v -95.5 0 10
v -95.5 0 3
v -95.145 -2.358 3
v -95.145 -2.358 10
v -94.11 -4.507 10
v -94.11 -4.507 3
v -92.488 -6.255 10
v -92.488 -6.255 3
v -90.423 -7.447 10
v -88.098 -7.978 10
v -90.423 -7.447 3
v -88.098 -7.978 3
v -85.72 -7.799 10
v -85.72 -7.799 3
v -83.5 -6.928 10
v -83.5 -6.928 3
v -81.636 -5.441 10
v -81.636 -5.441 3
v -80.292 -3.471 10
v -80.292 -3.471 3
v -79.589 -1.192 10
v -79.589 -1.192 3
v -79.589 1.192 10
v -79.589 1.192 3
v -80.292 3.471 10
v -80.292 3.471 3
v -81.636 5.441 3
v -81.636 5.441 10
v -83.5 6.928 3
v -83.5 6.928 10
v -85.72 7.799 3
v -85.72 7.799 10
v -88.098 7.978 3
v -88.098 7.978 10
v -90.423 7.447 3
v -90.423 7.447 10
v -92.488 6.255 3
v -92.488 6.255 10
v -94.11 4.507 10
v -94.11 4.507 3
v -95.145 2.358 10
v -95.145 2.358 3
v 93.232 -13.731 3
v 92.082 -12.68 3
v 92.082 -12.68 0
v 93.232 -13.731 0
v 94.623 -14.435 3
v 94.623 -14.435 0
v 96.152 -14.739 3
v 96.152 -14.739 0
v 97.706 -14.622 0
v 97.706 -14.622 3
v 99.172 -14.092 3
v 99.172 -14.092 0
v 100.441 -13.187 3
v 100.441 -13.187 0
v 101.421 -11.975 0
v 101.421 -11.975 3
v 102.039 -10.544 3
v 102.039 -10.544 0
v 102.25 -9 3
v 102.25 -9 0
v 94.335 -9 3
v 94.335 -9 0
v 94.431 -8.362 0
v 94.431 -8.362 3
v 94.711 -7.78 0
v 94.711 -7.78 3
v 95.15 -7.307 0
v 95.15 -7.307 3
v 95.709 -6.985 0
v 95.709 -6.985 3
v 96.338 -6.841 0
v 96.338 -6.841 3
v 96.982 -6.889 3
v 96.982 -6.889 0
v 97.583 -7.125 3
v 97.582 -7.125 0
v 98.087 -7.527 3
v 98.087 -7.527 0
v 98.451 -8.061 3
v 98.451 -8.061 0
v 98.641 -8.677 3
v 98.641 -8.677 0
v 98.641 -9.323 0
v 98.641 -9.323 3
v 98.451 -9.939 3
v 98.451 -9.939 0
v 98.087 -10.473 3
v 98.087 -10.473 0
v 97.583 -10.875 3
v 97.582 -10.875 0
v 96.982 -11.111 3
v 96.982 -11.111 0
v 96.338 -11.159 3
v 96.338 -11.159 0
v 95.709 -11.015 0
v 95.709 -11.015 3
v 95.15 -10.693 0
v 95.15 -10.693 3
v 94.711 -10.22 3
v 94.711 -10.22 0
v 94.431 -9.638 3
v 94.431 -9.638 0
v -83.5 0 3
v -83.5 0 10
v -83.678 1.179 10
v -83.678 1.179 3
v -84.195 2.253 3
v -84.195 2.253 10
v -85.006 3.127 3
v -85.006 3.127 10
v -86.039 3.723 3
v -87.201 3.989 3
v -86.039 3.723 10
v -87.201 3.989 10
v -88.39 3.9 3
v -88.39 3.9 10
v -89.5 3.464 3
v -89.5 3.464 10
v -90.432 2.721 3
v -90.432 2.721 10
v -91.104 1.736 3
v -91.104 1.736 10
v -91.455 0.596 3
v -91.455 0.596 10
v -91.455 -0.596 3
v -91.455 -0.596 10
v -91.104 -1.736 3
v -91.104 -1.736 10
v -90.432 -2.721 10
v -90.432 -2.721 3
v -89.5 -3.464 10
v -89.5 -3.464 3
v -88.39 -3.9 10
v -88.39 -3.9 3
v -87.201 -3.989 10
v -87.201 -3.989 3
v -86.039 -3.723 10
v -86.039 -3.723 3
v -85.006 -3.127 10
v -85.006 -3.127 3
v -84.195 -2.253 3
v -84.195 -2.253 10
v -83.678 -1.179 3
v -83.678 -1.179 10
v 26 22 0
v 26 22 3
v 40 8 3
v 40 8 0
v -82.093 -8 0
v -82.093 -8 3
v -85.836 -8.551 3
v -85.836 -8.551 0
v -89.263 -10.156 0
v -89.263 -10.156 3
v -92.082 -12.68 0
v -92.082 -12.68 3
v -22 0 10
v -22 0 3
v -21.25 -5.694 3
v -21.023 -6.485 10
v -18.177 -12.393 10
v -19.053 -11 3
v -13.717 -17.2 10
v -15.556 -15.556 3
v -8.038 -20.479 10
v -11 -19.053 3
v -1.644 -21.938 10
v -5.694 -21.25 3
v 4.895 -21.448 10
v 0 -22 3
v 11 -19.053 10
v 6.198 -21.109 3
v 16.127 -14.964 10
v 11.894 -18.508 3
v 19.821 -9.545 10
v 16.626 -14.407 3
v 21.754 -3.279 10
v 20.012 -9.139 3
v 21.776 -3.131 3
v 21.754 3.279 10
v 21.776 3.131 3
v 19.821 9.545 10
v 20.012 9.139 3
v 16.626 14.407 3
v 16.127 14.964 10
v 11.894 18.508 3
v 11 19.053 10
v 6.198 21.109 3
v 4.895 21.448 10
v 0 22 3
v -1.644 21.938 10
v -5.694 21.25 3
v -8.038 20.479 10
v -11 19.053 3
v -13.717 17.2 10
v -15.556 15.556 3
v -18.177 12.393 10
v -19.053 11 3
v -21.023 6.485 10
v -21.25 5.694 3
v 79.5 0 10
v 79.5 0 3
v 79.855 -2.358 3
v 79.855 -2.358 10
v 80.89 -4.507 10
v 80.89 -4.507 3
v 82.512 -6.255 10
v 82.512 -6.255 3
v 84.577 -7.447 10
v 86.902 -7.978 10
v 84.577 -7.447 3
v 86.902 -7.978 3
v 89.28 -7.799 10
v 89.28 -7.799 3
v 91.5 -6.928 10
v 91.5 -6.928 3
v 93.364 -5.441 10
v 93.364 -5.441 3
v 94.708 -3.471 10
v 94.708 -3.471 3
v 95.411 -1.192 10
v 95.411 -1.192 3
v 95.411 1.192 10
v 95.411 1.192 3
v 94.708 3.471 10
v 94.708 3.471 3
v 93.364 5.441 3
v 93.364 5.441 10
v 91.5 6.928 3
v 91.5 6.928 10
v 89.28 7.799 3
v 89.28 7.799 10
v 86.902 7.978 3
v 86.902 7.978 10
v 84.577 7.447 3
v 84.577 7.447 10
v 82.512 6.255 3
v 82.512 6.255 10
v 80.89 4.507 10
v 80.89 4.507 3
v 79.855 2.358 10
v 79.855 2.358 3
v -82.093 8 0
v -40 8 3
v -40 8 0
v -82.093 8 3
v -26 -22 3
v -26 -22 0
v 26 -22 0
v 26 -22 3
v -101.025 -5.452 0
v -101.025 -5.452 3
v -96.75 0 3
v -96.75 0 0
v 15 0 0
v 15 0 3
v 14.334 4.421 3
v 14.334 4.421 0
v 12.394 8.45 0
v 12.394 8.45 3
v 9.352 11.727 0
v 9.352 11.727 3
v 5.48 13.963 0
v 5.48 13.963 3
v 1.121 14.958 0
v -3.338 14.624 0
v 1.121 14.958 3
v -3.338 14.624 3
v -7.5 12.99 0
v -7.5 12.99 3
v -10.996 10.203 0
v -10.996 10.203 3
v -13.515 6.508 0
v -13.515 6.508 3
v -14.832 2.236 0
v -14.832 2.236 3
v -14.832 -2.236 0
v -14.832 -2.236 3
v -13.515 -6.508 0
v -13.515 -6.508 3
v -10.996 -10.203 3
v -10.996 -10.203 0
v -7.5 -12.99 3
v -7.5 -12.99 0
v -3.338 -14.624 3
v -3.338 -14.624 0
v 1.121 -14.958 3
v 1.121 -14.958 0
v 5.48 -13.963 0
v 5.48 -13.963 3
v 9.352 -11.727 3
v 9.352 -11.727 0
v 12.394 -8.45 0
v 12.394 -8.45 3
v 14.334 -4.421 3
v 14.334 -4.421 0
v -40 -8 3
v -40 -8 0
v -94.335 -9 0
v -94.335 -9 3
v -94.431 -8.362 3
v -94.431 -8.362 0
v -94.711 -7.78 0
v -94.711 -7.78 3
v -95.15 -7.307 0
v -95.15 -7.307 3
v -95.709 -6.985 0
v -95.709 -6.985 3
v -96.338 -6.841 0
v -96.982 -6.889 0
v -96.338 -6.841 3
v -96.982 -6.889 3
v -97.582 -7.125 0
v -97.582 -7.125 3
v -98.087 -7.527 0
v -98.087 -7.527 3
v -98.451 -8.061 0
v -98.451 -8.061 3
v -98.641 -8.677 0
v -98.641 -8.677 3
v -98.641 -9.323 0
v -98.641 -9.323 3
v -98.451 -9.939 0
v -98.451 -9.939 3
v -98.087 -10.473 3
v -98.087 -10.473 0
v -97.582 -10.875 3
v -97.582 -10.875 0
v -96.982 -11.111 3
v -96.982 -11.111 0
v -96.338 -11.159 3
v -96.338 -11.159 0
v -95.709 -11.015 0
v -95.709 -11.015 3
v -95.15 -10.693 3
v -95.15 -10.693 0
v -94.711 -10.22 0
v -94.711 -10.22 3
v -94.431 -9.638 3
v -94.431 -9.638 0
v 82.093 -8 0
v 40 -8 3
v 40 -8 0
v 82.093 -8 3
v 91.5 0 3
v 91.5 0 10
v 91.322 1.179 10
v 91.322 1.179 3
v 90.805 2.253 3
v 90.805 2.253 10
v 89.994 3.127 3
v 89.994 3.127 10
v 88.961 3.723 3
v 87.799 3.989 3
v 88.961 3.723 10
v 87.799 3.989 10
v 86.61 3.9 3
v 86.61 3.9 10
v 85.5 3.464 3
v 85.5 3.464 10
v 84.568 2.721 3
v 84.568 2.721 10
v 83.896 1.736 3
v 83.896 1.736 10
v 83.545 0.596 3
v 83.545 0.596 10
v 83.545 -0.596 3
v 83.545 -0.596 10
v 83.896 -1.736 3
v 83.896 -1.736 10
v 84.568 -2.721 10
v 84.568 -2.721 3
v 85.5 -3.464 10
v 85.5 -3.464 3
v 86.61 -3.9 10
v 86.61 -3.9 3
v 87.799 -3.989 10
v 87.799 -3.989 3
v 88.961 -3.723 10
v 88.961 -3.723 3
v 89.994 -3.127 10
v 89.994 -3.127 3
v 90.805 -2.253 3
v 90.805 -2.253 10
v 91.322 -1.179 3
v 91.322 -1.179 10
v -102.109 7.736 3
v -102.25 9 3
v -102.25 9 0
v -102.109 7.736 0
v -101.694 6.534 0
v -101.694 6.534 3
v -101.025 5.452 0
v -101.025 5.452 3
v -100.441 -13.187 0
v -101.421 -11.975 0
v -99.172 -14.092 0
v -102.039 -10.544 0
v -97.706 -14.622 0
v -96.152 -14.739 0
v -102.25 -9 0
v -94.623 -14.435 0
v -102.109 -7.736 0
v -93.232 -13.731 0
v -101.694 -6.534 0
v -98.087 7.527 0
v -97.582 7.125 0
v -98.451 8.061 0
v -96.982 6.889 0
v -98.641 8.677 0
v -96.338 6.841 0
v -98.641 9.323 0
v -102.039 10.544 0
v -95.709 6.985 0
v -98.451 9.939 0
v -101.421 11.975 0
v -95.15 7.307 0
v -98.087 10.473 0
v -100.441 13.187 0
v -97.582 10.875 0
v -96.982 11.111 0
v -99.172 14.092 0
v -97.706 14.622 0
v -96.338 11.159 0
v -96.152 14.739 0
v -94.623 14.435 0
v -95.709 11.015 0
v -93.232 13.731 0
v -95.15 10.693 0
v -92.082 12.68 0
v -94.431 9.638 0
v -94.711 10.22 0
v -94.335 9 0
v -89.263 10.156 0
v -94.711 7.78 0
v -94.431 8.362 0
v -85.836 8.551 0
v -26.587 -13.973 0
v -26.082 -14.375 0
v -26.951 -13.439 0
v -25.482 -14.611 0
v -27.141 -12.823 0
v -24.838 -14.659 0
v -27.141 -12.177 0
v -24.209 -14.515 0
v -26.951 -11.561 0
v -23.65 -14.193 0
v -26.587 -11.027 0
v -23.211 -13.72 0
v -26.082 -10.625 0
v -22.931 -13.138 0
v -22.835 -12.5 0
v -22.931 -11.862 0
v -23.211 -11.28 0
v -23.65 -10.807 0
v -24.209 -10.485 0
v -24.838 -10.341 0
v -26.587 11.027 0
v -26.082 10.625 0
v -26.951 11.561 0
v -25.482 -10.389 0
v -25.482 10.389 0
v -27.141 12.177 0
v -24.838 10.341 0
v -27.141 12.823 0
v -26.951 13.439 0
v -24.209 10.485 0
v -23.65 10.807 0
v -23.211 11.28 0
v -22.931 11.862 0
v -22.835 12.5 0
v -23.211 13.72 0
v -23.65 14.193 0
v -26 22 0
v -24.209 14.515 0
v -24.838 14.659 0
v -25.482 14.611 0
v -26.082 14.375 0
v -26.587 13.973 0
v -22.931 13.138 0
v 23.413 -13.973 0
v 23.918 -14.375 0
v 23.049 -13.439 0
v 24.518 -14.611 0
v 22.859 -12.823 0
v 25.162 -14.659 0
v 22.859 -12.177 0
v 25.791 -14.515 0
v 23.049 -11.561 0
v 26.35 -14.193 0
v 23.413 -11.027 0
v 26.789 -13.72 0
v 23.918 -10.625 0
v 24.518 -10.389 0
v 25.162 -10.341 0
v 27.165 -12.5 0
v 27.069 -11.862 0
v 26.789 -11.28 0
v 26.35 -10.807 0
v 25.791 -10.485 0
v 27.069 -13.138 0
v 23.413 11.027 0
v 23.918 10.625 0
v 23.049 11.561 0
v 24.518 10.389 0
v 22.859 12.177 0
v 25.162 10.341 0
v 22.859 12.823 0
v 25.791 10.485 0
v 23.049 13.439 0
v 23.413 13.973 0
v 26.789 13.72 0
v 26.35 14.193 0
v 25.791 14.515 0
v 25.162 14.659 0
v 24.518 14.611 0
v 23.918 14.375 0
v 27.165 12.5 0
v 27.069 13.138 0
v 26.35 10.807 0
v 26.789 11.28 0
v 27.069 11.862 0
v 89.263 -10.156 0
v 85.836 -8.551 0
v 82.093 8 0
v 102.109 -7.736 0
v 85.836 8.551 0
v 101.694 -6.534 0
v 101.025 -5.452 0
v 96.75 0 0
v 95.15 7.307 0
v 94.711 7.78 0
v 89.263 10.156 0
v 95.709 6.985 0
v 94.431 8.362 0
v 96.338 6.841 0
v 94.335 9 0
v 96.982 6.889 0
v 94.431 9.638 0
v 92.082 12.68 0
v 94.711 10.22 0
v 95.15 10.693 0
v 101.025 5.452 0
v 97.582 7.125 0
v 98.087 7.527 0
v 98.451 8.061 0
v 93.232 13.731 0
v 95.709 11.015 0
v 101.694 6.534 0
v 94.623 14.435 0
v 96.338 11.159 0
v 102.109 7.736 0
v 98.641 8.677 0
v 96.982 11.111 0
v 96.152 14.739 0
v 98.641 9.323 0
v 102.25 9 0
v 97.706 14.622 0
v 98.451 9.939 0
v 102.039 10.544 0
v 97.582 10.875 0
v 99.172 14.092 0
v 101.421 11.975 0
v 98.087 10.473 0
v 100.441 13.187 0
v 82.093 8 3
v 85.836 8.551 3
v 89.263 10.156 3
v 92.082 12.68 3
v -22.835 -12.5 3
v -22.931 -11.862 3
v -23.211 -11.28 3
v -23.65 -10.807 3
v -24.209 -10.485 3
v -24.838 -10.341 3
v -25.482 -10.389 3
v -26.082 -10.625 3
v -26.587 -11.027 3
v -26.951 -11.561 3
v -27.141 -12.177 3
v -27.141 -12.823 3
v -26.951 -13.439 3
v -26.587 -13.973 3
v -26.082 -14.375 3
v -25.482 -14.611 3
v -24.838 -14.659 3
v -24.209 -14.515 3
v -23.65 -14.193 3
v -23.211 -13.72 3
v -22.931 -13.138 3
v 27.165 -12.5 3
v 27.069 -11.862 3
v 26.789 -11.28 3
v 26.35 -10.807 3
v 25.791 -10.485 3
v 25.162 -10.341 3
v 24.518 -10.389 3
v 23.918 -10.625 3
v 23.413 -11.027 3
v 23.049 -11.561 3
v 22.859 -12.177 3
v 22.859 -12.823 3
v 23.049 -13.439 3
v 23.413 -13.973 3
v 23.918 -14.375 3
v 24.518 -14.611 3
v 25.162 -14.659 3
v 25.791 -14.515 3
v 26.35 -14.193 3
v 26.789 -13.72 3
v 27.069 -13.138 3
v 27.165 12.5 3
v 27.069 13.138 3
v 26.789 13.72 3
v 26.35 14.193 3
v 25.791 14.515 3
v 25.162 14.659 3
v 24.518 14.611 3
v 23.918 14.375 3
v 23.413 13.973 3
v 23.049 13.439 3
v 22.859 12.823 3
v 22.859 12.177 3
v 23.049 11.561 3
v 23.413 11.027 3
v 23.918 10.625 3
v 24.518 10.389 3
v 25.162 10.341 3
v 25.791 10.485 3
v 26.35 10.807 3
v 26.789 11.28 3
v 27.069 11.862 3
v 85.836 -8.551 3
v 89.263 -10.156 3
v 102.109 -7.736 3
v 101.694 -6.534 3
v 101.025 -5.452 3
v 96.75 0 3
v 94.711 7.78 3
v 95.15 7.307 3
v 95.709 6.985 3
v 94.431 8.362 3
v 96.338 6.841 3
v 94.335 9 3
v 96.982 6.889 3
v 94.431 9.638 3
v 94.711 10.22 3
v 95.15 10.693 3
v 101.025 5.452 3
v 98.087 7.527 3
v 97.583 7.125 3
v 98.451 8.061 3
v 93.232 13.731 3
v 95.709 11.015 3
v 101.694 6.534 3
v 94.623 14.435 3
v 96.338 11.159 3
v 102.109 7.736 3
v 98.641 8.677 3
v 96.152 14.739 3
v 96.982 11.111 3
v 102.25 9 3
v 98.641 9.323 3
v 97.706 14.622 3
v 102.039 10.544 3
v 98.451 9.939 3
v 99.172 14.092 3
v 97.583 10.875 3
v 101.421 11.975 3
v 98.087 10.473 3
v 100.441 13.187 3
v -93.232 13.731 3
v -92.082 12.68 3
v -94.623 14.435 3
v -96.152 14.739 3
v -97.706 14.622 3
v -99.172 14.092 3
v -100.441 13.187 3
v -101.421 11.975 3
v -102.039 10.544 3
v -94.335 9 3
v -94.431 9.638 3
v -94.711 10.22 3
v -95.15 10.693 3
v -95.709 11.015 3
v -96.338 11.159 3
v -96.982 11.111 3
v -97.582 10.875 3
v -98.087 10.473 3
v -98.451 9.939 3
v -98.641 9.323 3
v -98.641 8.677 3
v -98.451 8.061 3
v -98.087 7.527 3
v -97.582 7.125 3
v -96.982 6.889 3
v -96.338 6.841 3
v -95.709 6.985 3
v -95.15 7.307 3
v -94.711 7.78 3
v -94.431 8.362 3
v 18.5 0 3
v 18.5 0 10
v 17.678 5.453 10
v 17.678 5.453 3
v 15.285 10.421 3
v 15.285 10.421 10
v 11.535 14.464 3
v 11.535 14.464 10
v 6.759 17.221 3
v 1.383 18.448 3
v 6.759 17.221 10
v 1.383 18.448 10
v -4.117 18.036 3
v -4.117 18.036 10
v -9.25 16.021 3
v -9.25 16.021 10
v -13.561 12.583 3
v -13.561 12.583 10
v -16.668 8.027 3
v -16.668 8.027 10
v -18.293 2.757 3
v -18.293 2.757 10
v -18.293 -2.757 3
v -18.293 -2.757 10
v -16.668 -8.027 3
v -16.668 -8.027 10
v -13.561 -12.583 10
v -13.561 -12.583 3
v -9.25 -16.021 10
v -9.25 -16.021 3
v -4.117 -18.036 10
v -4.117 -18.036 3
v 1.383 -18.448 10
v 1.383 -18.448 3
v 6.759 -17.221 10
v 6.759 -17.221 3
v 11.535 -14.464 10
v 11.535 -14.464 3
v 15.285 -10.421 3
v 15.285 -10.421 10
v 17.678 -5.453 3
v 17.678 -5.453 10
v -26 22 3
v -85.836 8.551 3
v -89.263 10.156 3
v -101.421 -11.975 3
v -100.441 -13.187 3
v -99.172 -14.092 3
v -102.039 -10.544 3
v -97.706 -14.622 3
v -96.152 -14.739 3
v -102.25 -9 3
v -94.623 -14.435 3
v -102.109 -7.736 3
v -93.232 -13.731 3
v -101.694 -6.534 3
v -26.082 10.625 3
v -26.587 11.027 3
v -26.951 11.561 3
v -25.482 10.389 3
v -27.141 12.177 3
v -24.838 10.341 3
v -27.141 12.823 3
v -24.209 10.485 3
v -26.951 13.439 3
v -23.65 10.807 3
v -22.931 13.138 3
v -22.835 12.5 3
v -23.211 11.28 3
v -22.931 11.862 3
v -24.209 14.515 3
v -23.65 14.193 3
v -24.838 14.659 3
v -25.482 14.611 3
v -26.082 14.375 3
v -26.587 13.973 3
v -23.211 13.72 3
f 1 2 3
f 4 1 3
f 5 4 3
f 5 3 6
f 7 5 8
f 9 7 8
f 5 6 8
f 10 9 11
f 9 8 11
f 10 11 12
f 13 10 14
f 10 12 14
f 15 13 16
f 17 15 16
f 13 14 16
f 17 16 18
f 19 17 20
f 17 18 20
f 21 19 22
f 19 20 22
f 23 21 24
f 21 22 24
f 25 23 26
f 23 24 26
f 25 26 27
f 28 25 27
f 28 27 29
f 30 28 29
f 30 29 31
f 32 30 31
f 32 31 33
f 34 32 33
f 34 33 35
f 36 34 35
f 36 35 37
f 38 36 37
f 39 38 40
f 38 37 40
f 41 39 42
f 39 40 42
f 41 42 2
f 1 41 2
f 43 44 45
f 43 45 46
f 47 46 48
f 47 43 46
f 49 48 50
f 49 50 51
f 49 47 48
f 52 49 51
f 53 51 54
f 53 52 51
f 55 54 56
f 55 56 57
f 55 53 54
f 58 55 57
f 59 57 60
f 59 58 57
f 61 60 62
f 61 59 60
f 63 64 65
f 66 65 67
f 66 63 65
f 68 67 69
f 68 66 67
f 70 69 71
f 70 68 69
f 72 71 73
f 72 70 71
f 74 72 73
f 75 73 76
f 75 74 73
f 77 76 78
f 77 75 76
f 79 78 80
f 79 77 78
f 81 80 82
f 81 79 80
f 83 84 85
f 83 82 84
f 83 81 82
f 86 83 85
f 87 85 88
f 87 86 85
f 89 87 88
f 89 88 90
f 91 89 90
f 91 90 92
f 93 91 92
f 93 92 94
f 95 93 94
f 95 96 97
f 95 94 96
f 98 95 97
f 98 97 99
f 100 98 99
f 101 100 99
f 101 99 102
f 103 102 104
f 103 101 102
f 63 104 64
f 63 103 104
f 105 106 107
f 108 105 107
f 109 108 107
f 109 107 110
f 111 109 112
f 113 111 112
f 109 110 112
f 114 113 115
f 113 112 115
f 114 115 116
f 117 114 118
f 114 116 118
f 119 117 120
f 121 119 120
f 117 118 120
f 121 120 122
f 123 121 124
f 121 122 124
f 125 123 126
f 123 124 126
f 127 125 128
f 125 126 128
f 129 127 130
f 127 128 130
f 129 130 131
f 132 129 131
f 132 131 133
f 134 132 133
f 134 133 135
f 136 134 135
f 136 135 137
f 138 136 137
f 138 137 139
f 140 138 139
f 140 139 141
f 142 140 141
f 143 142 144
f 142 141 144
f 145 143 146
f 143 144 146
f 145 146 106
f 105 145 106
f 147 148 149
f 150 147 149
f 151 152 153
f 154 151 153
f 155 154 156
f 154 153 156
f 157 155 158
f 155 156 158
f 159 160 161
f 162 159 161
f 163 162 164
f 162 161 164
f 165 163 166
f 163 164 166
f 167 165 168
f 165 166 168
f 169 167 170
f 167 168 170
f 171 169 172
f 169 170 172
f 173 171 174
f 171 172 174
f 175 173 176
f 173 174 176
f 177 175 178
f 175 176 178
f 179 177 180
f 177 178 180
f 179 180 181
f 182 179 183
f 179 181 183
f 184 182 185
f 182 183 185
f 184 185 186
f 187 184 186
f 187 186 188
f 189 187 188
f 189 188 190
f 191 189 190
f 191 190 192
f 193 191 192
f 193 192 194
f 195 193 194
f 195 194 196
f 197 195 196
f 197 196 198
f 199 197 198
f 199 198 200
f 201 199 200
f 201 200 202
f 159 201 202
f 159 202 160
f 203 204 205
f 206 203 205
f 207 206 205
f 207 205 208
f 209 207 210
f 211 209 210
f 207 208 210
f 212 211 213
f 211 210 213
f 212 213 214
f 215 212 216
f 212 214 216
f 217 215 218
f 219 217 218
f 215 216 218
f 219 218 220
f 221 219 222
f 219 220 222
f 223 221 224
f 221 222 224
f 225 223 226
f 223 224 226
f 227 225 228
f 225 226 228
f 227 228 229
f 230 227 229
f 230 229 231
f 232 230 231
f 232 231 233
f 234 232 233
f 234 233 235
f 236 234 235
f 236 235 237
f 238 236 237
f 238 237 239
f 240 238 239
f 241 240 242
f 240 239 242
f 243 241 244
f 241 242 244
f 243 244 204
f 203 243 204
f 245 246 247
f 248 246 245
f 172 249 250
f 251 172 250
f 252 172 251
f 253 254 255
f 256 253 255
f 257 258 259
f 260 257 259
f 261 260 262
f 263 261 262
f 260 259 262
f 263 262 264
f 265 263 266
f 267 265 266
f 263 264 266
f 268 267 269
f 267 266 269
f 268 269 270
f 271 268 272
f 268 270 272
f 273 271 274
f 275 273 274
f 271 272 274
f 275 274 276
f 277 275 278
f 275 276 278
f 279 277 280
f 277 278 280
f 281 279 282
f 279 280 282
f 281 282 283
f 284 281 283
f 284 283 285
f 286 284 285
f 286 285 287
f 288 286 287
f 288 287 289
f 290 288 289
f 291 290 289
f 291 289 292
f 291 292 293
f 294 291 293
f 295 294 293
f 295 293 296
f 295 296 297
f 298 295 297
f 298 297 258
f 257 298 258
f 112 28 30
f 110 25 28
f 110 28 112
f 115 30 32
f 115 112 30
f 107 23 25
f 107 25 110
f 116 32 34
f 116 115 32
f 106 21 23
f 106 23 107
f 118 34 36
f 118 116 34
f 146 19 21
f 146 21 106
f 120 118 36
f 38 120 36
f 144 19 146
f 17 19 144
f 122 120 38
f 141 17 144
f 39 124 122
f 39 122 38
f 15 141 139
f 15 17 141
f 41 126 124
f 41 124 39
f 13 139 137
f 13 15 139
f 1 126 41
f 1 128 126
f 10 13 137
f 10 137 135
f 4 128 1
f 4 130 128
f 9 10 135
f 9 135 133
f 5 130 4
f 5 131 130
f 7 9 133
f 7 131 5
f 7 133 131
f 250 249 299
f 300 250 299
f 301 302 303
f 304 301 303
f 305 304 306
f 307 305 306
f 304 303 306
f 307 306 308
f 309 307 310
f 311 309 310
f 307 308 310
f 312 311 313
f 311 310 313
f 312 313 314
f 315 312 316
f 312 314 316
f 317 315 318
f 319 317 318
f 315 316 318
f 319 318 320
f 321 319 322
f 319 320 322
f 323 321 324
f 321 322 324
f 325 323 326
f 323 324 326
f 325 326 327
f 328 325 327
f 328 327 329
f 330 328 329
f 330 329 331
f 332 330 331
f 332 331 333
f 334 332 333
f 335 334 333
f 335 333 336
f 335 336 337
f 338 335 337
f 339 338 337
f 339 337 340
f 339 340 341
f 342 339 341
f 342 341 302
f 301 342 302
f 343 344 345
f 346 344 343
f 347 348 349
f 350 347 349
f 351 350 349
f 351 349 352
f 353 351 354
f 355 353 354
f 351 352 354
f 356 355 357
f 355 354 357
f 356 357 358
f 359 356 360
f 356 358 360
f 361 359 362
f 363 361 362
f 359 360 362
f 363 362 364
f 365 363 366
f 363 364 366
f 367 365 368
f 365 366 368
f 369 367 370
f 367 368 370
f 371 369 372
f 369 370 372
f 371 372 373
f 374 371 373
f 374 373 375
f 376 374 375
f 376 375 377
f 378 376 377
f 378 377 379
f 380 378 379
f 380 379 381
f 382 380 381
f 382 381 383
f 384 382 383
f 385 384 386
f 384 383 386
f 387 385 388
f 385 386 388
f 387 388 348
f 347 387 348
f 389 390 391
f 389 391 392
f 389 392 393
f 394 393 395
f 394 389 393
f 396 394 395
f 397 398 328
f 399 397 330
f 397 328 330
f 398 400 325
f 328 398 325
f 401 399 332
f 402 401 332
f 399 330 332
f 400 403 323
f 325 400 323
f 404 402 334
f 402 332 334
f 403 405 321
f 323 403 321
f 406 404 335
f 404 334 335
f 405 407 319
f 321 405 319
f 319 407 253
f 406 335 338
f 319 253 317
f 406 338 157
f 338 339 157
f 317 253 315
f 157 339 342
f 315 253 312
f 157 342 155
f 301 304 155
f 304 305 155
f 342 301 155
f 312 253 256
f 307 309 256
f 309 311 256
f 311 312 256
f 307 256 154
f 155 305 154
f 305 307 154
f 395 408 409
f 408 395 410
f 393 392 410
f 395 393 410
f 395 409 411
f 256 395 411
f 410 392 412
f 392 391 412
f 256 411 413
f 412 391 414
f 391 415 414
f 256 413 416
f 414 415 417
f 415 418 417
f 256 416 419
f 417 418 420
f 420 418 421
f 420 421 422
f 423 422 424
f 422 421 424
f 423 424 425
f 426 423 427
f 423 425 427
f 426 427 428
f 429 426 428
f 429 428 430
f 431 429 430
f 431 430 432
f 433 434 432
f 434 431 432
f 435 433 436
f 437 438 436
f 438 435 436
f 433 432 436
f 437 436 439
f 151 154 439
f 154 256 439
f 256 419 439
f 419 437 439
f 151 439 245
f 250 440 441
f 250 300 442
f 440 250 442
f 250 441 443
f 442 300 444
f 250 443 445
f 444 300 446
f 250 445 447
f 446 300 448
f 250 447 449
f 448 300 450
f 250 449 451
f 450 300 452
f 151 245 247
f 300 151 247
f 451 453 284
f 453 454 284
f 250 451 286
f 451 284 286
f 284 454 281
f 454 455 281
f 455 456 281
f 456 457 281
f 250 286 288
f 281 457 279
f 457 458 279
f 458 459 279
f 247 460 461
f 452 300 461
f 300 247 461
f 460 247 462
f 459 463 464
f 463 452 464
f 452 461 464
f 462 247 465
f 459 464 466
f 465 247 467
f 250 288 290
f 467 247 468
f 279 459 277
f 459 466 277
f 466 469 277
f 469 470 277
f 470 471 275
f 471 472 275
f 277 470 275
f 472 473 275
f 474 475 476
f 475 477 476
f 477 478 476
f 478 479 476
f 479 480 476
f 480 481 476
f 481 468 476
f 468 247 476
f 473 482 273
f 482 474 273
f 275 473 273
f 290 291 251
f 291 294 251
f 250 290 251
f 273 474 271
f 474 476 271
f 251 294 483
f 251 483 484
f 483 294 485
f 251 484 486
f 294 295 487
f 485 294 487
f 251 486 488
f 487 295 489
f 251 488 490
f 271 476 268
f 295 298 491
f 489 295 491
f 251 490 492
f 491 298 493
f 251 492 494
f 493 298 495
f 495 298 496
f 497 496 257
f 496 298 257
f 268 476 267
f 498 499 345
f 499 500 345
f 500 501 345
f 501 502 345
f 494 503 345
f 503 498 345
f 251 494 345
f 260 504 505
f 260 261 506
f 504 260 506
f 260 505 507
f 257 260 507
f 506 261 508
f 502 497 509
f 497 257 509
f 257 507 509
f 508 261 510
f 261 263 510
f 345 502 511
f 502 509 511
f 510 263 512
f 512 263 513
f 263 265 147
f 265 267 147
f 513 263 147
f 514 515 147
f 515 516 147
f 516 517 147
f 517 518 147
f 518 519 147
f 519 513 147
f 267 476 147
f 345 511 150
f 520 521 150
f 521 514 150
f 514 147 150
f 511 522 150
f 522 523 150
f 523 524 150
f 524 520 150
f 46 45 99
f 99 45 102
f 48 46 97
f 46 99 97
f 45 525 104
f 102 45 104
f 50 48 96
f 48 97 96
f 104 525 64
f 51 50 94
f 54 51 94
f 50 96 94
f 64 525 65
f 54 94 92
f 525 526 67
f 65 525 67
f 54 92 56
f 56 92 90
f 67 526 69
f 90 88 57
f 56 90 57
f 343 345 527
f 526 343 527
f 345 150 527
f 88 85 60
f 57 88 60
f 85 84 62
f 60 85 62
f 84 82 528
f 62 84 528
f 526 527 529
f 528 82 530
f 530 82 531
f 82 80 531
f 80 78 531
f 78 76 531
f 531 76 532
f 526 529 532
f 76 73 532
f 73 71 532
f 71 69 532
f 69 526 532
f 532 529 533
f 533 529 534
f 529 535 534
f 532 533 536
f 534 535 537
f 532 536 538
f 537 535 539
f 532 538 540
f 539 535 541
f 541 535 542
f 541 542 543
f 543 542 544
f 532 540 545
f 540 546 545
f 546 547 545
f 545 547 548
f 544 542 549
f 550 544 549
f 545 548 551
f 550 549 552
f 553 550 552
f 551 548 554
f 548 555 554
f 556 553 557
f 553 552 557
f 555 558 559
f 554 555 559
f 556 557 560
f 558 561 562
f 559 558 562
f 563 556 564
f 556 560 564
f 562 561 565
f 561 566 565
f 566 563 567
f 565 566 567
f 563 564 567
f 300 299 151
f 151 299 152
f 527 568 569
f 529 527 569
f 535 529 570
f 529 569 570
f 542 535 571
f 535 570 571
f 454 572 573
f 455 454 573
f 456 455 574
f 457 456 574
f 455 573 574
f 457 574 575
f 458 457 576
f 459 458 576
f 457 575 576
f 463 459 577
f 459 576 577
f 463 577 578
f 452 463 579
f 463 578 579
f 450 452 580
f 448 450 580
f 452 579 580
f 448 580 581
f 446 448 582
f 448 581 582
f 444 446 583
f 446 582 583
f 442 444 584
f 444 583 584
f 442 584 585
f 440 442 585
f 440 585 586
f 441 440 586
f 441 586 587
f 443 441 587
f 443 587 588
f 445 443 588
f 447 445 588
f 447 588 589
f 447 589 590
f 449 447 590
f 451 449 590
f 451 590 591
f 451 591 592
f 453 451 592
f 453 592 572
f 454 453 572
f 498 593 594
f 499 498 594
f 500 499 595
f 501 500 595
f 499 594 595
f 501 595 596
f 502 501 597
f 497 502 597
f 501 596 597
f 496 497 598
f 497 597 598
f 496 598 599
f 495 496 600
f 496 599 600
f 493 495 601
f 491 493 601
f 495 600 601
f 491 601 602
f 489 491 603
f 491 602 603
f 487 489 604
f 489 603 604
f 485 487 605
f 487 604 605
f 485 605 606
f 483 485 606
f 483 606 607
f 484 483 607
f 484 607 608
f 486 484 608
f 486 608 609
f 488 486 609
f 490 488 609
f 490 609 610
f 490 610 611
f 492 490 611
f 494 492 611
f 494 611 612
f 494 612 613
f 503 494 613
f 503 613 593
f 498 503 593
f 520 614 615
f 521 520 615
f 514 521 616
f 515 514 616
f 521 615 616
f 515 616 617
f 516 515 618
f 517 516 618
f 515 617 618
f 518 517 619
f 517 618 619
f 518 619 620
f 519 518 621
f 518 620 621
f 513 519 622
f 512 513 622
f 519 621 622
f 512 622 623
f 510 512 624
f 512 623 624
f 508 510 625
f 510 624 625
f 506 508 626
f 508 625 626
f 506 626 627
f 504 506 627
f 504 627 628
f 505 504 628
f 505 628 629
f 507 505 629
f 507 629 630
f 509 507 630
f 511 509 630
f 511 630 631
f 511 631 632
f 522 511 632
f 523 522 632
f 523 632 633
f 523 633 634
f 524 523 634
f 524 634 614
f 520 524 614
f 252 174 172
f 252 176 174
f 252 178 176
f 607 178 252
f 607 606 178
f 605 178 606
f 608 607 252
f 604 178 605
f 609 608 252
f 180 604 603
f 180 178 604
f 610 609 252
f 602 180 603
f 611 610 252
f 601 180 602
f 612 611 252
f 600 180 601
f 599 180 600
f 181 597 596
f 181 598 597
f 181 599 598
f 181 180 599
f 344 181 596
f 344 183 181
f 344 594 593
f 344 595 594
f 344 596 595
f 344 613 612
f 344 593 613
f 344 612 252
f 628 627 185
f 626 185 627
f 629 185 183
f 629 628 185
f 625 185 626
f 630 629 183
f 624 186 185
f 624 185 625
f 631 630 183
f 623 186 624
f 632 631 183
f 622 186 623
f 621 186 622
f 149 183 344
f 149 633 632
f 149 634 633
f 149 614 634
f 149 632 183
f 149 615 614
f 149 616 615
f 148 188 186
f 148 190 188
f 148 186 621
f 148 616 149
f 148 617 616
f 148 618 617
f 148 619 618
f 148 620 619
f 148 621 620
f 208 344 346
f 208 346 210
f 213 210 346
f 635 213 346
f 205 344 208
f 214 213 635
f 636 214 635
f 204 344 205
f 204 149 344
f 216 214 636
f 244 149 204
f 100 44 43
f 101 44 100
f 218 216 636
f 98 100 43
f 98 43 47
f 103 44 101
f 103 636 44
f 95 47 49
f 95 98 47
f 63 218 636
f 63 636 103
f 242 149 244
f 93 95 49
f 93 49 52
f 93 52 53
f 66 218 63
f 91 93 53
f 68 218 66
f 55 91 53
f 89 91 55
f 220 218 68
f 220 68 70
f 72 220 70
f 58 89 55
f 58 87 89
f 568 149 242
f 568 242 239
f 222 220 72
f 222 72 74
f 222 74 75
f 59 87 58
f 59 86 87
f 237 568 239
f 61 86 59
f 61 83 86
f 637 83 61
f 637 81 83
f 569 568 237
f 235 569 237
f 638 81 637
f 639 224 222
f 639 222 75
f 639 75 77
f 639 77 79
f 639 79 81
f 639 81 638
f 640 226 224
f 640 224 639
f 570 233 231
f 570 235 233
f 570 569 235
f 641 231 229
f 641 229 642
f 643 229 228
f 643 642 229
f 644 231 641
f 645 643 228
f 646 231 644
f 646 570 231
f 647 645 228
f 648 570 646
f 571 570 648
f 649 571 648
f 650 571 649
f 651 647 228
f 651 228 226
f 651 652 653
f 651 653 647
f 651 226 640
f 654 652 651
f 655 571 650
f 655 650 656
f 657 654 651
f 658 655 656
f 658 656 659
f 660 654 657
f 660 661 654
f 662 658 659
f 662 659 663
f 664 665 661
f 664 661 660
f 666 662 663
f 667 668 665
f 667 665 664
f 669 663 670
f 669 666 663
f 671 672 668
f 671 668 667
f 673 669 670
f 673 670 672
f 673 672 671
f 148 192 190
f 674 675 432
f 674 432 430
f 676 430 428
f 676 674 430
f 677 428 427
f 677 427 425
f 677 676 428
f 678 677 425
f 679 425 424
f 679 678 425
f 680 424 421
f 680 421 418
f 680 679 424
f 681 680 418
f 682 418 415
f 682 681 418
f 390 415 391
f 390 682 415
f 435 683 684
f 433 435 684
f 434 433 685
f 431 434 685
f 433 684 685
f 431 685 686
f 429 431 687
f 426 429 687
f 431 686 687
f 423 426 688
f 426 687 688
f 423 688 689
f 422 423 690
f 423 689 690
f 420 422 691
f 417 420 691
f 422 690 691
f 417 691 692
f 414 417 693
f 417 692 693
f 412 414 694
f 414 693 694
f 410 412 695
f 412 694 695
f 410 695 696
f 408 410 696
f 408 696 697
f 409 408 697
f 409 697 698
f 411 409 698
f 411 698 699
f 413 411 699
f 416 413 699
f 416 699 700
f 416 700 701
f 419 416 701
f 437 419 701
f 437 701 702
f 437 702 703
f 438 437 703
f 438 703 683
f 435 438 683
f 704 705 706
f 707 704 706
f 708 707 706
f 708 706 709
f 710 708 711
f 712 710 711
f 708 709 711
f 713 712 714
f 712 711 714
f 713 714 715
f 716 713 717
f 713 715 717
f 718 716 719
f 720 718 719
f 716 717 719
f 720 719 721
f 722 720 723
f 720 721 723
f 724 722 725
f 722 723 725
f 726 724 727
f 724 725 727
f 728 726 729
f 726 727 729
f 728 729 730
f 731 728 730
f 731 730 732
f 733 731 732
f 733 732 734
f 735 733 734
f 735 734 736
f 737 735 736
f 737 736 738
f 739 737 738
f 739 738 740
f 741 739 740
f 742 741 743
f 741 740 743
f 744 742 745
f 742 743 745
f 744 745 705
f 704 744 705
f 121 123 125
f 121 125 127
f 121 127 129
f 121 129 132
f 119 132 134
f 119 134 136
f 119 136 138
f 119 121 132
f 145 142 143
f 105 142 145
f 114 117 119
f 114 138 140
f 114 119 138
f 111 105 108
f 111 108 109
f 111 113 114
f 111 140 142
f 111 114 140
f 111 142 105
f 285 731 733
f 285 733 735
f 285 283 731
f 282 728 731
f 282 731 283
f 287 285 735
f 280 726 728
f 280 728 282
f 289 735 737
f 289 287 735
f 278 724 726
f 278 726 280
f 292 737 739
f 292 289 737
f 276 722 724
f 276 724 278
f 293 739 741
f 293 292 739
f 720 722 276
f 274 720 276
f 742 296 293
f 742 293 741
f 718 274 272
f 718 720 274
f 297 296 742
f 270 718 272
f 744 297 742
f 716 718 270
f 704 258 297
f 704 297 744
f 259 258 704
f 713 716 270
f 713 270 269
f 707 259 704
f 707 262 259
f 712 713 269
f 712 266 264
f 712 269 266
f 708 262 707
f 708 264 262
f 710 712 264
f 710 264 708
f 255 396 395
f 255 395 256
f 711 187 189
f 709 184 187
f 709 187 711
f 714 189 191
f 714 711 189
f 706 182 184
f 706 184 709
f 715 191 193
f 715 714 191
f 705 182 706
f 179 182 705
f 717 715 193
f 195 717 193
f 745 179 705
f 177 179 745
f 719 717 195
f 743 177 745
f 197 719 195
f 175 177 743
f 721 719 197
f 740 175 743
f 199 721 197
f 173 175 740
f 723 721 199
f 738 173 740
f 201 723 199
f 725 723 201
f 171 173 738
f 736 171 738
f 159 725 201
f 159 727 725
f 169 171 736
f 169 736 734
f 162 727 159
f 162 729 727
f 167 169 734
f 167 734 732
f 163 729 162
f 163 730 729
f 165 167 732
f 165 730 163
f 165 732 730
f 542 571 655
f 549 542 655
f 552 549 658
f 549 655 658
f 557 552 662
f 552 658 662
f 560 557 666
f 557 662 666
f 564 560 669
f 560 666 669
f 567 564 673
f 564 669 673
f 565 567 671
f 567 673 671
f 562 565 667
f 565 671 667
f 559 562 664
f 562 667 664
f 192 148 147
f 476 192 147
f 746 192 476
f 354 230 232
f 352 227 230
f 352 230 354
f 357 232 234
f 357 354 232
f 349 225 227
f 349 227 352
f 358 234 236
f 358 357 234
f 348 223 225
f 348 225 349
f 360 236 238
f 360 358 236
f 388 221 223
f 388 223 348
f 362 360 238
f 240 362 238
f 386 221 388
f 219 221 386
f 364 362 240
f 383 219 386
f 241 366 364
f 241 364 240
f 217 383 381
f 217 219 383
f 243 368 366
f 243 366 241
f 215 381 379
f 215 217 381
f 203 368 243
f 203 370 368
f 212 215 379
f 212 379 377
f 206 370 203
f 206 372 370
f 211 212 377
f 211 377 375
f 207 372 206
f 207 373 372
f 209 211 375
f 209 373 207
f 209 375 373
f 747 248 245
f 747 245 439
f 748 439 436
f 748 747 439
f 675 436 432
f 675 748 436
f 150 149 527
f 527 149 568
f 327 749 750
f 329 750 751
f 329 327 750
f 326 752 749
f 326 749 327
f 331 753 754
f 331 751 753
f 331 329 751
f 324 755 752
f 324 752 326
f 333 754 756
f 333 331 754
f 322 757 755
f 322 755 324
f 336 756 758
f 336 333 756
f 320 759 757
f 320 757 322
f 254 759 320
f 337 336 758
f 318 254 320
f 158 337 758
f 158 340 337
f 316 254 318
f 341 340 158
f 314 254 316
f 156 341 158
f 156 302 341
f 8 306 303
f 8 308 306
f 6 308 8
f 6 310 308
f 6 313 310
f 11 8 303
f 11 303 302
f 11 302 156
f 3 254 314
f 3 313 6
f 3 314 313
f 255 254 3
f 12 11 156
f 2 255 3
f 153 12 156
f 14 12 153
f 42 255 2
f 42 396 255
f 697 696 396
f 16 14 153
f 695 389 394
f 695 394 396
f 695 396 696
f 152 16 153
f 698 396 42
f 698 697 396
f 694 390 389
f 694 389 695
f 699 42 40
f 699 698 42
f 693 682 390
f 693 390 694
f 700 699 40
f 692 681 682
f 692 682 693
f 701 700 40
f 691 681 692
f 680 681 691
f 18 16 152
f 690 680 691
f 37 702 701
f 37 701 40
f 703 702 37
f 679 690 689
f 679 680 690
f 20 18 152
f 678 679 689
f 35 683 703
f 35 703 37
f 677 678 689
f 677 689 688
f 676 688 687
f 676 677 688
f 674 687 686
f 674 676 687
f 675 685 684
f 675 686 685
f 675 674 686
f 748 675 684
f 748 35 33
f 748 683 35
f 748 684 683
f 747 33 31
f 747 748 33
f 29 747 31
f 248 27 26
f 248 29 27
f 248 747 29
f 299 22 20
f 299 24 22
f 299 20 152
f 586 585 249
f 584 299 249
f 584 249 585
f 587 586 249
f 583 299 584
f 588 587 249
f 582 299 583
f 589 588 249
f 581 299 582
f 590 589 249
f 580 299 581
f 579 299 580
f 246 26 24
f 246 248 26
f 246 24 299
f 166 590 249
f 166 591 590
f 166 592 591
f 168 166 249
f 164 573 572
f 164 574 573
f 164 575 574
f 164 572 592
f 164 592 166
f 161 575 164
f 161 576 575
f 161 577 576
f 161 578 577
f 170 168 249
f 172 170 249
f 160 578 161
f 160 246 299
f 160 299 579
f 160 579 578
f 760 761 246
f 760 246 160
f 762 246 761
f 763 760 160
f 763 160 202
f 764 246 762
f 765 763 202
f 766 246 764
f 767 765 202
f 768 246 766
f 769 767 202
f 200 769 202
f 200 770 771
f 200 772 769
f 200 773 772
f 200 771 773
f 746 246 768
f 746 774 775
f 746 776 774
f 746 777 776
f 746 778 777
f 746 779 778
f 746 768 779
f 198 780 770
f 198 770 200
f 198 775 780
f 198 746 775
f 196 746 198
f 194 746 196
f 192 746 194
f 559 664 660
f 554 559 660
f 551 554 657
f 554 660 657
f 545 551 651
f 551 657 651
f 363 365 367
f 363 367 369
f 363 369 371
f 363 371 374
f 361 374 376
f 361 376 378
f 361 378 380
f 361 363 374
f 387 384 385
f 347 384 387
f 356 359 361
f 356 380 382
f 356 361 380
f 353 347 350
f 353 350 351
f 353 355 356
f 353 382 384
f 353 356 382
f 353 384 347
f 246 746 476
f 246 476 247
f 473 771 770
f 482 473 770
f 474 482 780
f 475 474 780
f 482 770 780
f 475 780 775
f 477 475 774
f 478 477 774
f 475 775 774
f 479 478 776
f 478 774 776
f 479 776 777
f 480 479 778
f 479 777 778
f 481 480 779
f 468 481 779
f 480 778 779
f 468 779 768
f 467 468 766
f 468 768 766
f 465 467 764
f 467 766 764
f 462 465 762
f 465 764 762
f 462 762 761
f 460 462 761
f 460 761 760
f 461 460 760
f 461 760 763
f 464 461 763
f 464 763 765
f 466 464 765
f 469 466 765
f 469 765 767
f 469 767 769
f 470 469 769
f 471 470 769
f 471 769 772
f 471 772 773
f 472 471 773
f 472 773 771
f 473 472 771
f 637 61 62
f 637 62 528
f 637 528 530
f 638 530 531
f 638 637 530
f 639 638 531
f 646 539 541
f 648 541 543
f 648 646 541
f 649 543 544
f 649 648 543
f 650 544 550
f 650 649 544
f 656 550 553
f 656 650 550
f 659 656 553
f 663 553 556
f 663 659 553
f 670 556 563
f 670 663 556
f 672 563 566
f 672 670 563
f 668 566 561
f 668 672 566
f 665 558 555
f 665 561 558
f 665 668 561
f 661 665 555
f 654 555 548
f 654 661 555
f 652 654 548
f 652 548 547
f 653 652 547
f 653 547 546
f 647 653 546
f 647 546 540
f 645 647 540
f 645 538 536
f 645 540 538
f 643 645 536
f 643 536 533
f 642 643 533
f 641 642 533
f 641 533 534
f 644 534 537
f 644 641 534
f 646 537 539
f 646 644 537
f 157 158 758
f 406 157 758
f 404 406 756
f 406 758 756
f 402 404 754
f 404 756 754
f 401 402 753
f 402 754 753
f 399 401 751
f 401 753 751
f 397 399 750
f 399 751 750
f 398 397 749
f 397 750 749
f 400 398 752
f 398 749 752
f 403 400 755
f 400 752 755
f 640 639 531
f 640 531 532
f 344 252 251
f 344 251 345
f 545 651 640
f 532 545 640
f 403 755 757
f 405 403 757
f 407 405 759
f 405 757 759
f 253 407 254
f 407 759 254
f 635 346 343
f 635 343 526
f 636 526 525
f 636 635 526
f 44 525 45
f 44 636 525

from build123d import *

# Parameters (mm, degrees)
SKETCH1_W               = 204.5
SKETCH1_H               = 62.5
BOSS_EXTRUDE1_DEPTH     = 3
SKETCH2_R               = 8
BOSS_EXTRUDE2_DEPTH     = 7
SKETCH3_R               = 22
BOSS_EXTRUDE3_DEPTH     = 7
SKETCH4_R               = 2.165
CUT_EXTRUDE1_DEPTH      = 108.147678463
CUT_EXTRUDE3_DEPTH      = 7
MIRROR2_COPY_1_SKETCH_R = 2.165
MIRROR2_COPY_1_DEPTH    = 108.147678463
MIRROR2_COPY_2_DEPTH    = 7
MIRROR2_COPY_3_SKETCH_R = 2.165
MIRROR2_COPY_3_DEPTH    = 108.147678463
SKETCH7_R               = 18.5
CUT_EXTRUDE4_DEPTH      = 7
SKETCH11_R              = 4
CUT_EXTRUDE7_DEPTH      = 7
SKETCH12_R              = 15
CUT_EXTRUDE8_DEPTH      = 105.82395957
SKETCH13_R              = 2.165
CUT_EXTRUDE9_DEPTH      = 105.82395957


with BuildPart() as part:
    # Sketch1 → Boss-Extrude1 (new body)
    with BuildSketch(Plane.XY):
        Rectangle(SKETCH1_W, SKETCH1_H)
    extrude(amount=BOSS_EXTRUDE1_DEPTH)

    # Sketch2 → Boss-Extrude2 (add)
    with BuildSketch(Plane.XY.offset(3)):
        with Locations(Location((-87.5, 0, 0), (0, 0, 180))):
            Circle(SKETCH2_R)
        with Locations(Location((87.5, 0, 0), (0, 0, 180))):
            Circle(SKETCH2_R)
    extrude(amount=BOSS_EXTRUDE2_DEPTH)

    # Sketch3 → Boss-Extrude3 (add)
    with BuildSketch(Plane.XY.offset(3)):
        with Locations(Location((0, 0, 0), (0, 0, 180))):
            Circle(SKETCH3_R)
    extrude(amount=BOSS_EXTRUDE3_DEPTH)

    # Sketch4 → Cut-Extrude1 (cut, through all)
    with BuildSketch(Plane.XY.offset(3)):
        with Locations((-96.5, 9)):
            Circle(SKETCH4_R)
        with Locations((-96.5, -9)):
            Circle(SKETCH4_R)
    cut_extrude1 = extrude(amount=-CUT_EXTRUDE1_DEPTH, mode=Mode.SUBTRACT)

    # Sketch6 → Cut-Extrude3 (cut)
    with BuildSketch(Plane.XY.offset(3)):
        with BuildLine():
            Line((-102.25, 0), (-102.25, -9))
            ThreePointArc((-102.25, -9), (-101.935103767, -7.123261595), (-101.024905378, -5.452080705))
            Line((-101.024905378, -5.452080705), (-96.75, 0))
            Line((-96.75, 0), (-102.25, 0))
        make_face()
        with BuildLine():
            Line((-40, -8), (-82.092970466, -8))
            ThreePointArc((-82.092970466, -8), (-87.608403359, -9.22799932), (-92.081844276, -12.68))
            ThreePointArc((-92.081844276, -12.68), (-98.456796437, -14.406796437), (-102.25, -9))
            Line((-102.25, -9), (-102.25, -31.25))
            Line((-102.25, -31.25), (0, -31.25))
            Line((0, -31.25), (0, -22))
            Line((0, -22), (-26, -22))
            Line((-26, -22), (-40, -8))
        make_face()
    cut_extrude3 = extrude(amount=-CUT_EXTRUDE3_DEPTH, mode=Mode.SUBTRACT)

    # Mirror1: Cut-Extrude1, Cut-Extrude3 across plane
    add(cut_extrude1.mirror(Plane(origin=(0, 0, 0), x_dir=(0, 0, 1), z_dir=(1, 0, 0))), mode=Mode.SUBTRACT)
    add(cut_extrude3.mirror(Plane(origin=(0, 0, 0), x_dir=(0, 0, 1), z_dir=(1, 0, 0))), mode=Mode.SUBTRACT)

    # Mirror2: Cut-Extrude3 across plane
    add(cut_extrude3.mirror(Plane.ZX), mode=Mode.SUBTRACT)

    # Mirror2 copy 1 sketch → Mirror2 copy 1 (cut, through all)
    with BuildSketch(Plane(origin=(0, 0, 3), x_dir=(-1, 0, 0), z_dir=(0, 0, 1))):
        with Locations((-96.5, 9)):
            Circle(MIRROR2_COPY_1_SKETCH_R)
        with Locations((-96.5, -9)):
            Circle(MIRROR2_COPY_1_SKETCH_R)
    extrude(amount=-MIRROR2_COPY_1_DEPTH, mode=Mode.SUBTRACT)

    # Mirror2 copy 2 sketch → Mirror2 copy 2 (cut)
    with BuildSketch(Plane(origin=(0, 0, 3), x_dir=(-1, 0, 0), z_dir=(0, 0, 1))):
        with BuildLine():
            Line((-102.25, 0), (-102.25, -9))
            ThreePointArc((-102.25, -9), (-101.935103767, -7.123261595), (-101.024905378, -5.452080705))
            Line((-101.024905378, -5.452080705), (-96.75, 0))
            Line((-96.75, 0), (-102.25, 0))
        make_face()
        with BuildLine():
            Line((-40, -8), (-82.092970466, -8))
            ThreePointArc((-82.092970466, -8), (-87.608403359, -9.22799932), (-92.081844276, -12.68))
            ThreePointArc((-92.081844276, -12.68), (-98.456796437, -14.406796437), (-102.25, -9))
            Line((-102.25, -9), (-102.25, -31.25))
            Line((-102.25, -31.25), (0, -31.25))
            Line((0, -31.25), (0, -22))
            Line((0, -22), (-26, -22))
            Line((-26, -22), (-40, -8))
        make_face()
    extrude(amount=-MIRROR2_COPY_2_DEPTH, mode=Mode.SUBTRACT)

    # Mirror2 copy 3 sketch → Mirror2 copy 3 (cut, through all)
    with BuildSketch(Plane.XY.offset(3)):
        with Locations((-96.5, -9)):
            Circle(MIRROR2_COPY_3_SKETCH_R)
        with Locations((-96.5, 9)):
            Circle(MIRROR2_COPY_3_SKETCH_R)
    extrude(amount=-MIRROR2_COPY_3_DEPTH, mode=Mode.SUBTRACT)

    # Sketch7 → Cut-Extrude4 (cut)
    with BuildSketch(Plane.XY.offset(10)):
        Circle(SKETCH7_R)
    extrude(amount=-CUT_EXTRUDE4_DEPTH, mode=Mode.SUBTRACT)

    # Sketch11 → Cut-Extrude7 (cut)
    with BuildSketch(Plane.XY.offset(10)):
        with Locations((-87.5, 0)):
            Circle(SKETCH11_R)
        with Locations((87.5, 0)):
            Circle(SKETCH11_R)
    extrude(amount=-CUT_EXTRUDE7_DEPTH, mode=Mode.SUBTRACT)

    # Sketch12 → Cut-Extrude8 (cut, through all)
    with BuildSketch(Plane.XY.offset(3)):
        Circle(SKETCH12_R)
    extrude(amount=-CUT_EXTRUDE8_DEPTH, mode=Mode.SUBTRACT)

    # Sketch13 → Cut-Extrude9 (cut, through all)
    with BuildSketch(Plane.XY.offset(3)):
        with Locations((-25, 12.5)):
            Circle(SKETCH13_R)
        with Locations((-25, -12.5)):
            Circle(SKETCH13_R)
        with Locations((25, -12.5)):
            Circle(SKETCH13_R)
        with Locations((25, 12.5)):
            Circle(SKETCH13_R)
    extrude(amount=-CUT_EXTRUDE9_DEPTH, mode=Mode.SUBTRACT)


solid = part.part
